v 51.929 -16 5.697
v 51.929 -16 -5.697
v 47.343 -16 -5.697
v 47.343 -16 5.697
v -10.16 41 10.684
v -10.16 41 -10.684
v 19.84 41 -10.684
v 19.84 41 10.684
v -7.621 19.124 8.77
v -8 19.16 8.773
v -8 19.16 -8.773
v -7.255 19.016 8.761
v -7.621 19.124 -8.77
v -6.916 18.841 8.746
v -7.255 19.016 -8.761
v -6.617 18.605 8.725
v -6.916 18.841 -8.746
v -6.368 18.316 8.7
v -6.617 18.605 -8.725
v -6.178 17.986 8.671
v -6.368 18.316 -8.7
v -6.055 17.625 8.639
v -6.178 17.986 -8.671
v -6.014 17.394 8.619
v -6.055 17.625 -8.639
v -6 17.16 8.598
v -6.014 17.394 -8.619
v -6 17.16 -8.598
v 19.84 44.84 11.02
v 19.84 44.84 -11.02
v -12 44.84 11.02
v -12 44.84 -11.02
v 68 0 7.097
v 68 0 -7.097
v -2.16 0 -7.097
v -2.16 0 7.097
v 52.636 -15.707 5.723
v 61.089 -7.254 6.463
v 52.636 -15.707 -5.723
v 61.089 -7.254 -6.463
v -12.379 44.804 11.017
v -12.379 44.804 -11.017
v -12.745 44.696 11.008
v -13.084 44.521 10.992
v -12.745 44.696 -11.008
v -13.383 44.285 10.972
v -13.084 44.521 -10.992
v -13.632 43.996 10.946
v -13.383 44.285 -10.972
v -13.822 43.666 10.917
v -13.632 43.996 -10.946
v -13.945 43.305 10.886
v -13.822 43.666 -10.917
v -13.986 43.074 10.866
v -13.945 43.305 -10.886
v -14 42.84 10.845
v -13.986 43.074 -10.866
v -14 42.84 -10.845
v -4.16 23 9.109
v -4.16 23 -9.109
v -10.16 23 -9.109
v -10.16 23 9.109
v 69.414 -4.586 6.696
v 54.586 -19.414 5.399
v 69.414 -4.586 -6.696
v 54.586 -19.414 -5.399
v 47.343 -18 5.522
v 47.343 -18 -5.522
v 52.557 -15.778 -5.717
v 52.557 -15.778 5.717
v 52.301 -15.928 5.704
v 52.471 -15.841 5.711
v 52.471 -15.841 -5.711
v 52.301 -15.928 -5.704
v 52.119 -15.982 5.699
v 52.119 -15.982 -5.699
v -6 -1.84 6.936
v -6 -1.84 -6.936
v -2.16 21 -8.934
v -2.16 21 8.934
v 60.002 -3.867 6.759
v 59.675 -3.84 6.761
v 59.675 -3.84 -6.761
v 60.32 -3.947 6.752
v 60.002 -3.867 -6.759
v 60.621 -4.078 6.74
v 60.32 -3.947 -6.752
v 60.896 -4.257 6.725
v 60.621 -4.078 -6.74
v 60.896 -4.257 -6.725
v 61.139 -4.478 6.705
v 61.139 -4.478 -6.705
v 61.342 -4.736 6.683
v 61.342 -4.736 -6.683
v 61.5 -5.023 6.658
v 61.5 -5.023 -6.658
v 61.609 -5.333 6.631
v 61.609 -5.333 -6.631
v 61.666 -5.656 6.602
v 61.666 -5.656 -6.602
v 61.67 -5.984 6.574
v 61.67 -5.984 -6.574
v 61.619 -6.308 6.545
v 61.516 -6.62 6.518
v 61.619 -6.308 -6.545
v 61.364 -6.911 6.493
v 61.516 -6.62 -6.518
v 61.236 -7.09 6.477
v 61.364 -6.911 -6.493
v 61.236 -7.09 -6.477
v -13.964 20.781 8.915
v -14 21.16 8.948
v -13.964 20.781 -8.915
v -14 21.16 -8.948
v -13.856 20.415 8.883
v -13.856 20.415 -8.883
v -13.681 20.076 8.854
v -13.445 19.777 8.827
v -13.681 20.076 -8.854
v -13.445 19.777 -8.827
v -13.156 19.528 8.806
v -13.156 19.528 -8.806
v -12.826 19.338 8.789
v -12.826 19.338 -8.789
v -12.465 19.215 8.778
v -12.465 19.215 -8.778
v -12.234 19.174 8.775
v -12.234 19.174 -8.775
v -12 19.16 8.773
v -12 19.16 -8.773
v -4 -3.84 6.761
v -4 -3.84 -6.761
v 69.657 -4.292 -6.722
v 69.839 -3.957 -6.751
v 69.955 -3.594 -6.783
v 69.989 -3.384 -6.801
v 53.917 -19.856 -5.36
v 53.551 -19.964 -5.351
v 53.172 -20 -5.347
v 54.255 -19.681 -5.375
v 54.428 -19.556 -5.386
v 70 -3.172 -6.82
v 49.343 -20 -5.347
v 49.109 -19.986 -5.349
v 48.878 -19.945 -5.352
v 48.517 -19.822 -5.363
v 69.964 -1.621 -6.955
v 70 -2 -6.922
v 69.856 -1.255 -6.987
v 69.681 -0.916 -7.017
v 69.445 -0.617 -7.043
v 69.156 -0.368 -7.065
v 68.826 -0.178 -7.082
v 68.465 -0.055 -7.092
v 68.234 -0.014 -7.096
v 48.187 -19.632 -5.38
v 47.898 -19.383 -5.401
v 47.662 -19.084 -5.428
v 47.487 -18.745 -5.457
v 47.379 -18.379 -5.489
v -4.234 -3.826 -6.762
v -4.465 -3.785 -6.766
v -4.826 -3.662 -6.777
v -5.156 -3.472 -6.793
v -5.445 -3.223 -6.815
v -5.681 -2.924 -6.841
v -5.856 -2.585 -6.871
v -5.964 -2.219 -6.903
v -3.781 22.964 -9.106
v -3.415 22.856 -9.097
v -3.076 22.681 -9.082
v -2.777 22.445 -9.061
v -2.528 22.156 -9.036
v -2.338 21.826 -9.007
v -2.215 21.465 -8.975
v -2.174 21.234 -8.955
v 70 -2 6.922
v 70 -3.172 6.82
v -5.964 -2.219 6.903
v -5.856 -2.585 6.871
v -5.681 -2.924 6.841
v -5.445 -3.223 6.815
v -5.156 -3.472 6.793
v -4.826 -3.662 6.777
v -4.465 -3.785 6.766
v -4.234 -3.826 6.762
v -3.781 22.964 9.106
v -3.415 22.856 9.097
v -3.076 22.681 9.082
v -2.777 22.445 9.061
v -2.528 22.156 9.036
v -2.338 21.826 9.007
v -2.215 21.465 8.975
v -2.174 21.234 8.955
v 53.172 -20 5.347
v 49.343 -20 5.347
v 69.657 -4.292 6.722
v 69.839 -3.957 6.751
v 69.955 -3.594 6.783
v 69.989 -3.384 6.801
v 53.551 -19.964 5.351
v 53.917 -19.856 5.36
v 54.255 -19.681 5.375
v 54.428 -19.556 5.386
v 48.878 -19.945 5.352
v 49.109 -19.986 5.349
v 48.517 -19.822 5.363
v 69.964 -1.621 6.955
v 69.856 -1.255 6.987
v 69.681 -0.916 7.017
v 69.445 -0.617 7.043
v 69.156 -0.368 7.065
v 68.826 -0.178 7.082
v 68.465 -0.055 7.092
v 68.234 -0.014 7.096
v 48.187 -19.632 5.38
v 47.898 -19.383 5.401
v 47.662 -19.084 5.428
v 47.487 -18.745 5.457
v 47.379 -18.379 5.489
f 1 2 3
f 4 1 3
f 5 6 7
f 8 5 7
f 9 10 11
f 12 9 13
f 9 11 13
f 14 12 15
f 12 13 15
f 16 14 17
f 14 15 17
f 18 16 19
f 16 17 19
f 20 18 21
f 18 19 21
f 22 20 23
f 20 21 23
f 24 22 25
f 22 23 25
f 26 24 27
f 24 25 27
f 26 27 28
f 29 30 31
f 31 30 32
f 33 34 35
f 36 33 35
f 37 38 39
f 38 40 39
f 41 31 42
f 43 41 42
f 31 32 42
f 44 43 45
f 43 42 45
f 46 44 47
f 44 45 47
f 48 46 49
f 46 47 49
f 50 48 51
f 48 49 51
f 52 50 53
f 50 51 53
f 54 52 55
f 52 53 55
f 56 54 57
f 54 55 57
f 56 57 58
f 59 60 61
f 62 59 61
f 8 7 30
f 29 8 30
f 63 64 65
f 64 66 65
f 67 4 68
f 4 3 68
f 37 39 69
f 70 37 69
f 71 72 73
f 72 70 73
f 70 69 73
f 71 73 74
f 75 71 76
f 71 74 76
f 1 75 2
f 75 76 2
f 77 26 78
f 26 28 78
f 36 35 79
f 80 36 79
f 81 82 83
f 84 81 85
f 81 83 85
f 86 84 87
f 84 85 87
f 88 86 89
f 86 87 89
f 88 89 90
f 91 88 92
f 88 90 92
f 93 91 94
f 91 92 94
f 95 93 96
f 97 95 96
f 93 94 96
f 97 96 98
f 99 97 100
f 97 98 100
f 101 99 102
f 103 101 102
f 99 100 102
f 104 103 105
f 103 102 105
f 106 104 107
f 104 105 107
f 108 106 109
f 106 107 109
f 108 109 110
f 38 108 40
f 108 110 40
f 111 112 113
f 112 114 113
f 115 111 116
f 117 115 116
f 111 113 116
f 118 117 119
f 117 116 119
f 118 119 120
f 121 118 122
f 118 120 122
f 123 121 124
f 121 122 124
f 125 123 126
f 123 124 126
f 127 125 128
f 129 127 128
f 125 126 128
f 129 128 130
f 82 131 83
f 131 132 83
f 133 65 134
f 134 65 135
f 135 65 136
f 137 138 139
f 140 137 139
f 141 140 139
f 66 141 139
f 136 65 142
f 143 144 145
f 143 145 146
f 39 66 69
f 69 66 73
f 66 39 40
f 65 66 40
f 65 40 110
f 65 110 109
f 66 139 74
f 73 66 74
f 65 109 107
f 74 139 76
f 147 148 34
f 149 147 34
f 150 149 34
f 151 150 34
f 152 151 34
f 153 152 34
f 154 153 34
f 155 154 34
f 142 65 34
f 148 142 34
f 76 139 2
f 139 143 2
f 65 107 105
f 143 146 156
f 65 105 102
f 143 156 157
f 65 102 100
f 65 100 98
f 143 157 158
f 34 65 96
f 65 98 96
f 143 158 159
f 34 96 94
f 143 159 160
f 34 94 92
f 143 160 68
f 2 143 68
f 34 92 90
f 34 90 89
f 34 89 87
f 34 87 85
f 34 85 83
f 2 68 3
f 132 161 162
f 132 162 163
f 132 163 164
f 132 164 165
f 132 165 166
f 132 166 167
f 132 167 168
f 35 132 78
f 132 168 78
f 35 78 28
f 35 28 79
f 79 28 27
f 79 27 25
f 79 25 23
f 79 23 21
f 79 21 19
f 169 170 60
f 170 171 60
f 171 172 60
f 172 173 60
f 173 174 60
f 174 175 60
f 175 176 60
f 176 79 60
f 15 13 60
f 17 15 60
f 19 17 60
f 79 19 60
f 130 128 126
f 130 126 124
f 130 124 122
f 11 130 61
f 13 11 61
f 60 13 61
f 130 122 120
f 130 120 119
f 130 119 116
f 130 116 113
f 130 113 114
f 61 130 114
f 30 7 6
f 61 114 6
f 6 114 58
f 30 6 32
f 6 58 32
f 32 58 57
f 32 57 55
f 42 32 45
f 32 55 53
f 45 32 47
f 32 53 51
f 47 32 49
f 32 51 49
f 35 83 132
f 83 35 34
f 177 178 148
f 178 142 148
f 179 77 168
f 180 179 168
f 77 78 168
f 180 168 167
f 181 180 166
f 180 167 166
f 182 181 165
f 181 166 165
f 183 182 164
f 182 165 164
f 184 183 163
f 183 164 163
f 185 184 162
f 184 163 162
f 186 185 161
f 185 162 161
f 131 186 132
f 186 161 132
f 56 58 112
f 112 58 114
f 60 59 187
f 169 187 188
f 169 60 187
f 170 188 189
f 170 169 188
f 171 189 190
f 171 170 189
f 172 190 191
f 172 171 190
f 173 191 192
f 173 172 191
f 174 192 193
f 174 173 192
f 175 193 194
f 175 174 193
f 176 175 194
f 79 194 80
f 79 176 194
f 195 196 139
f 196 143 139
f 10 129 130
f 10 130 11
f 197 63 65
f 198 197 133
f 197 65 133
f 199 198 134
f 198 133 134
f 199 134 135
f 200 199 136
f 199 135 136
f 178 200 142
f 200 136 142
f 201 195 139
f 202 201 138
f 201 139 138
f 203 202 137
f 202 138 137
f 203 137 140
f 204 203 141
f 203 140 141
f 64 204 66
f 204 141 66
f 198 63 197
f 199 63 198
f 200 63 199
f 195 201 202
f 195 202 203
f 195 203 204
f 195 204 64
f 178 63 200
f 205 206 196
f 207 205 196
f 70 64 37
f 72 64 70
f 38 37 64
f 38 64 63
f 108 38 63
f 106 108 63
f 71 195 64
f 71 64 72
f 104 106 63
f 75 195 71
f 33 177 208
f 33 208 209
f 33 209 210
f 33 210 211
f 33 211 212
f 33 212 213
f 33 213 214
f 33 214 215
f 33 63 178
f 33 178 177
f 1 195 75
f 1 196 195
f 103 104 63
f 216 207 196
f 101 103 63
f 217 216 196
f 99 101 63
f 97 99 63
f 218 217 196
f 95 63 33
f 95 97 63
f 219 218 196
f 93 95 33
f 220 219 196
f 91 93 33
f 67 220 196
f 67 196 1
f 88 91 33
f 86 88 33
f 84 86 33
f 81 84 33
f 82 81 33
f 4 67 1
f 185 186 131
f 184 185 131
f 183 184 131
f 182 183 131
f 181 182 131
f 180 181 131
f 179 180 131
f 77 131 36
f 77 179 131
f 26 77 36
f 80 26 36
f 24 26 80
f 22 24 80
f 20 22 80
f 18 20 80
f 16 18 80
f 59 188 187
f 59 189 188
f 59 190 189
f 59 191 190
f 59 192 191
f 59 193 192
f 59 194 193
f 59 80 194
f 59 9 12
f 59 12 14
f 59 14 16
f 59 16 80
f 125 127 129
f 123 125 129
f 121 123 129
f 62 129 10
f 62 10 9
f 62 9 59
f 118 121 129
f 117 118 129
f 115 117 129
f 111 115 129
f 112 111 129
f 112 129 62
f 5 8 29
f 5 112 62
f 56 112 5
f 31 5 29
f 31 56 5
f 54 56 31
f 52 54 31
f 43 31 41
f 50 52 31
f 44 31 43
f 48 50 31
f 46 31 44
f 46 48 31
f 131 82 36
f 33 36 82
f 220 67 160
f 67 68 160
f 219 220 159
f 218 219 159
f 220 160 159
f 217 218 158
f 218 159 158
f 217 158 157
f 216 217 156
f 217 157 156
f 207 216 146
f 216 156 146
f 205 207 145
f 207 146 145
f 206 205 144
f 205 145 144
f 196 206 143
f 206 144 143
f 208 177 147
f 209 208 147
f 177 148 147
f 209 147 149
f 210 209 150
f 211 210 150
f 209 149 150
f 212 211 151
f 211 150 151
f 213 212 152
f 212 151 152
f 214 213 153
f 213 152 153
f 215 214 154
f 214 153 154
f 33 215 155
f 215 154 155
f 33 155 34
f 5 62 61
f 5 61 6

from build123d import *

# Parameters (mm, degrees)
F1_DEPTH = 30
F5_REACH = 130.7668048394
F6_DEPTH = 30
F8_R     = 2


# Not quite as in the source:
# - two fillets or chamfers of one size are made in one step


with BuildPart() as f1:
    # F0 (on Top) → F1 (new body, symmetric)
    with BuildSketch(Plane.XY):
        with BuildLine():
            Line((-2.159999702, 23), (-10.159999702, 23))
            Line((-10.159999702, 23), (-10.159999702, 41))
            Line((-10.159999702, 41), (19.840000298, 41))
            Line((19.840000298, 41), (19.840000298, 44.84))
            Line((19.840000298, 44.84), (-13.999999702, 44.84))
            Line((-13.999999702, 44.84), (-13.999999702, 19.16))
            Line((-13.999999702, 19.16), (-5.999999702, 19.16))
            Line((-5.999999702, 19.16), (-5.999999702, -3.84))
            Line((-5.999999702, -3.84), (64.5031457505, -3.84))
            Line((64.5031457505, -3.84), (52.6360389693, -15.7071067812))
            ThreePointArc((52.6360389693, -15.7071067812), (52.3116156205, -15.9238795325), (51.9289321881, -16))
            Line((51.9289321881, -16), (47.3431457505, -16))
            Line((47.3431457505, -16), (47.3431457505, -20))
            Line((47.3431457505, -20), (54, -20))
            Line((54, -20), (70, -4))
            Line((70, -4), (70, 0))
            Line((70, 0), (-2.159999702, 0))
            Line((-2.159999702, 0), (-2.159999702, 23))
        make_face()
    extrude(amount=F1_DEPTH, both=True)

    f5_end = Plane(origin=(0, -0.6162060448, 7.0432673219), x_dir=(0, 0.9961946981, 0.0871557427), z_dir=(0, -0.0871557427, 0.9961946981))
    # F1_face2 (on face) → F5 (cut, up to a plane its end follows)
    with BuildSketch(Plane(origin=(19.935386065, 10.6416249654, 30), x_dir=(1, 0, 0), z_dir=(0, 0, 1))):
        with BuildLine():
            Line((-22.095385767, -10.6416249654), (-22.095385767, 12.3583750346))
            Line((-22.095385767, 12.3583750346), (-30.095385767, 12.3583750346))
            Line((-30.095385767, 12.3583750346), (-30.095385767, 30.3583750346))
            Line((-30.095385767, 30.3583750346), (-0.095385767, 30.3583750346))
            Line((-0.095385767, 30.3583750346), (-0.095385767, 34.1983750346))
            Line((-0.095385767, 34.1983750346), (-33.935385767, 34.1983750346))
            Line((-33.935385767, 34.1983750346), (-33.935385767, 8.5183750346))
            Line((-33.935385767, 8.5183750346), (-25.935385767, 8.5183750346))
            Line((-25.935385767, 8.5183750346), (-25.935385767, -14.4816249654))
            Line((-25.935385767, -14.4816249654), (44.5677596855, -14.4816249654))
            Line((44.5677596855, -14.4816249654), (32.7006529043, -26.3487317465))
            ThreePointArc((32.7006529043, -26.3487317465), (32.3762295555, -26.5655044979), (31.9935461231, -26.6416249654))
            Line((31.9935461231, -26.6416249654), (27.4077596855, -26.6416249654))
            Line((27.4077596855, -26.6416249654), (27.4077596855, -30.6416249654))
            Line((27.4077596855, -30.6416249654), (34.064613935, -30.6416249654))
            Line((34.064613935, -30.6416249654), (50.064613935, -14.6416249654))
            Line((50.064613935, -14.6416249654), (50.064613935, -10.6416249654))
            Line((50.064613935, -10.6416249654), (-22.095385767, -10.6416249654))
        make_face()
    f5_long = extrude(amount=-F5_REACH, mode=Mode.PRIVATE)
    add(split(f5_long, bisect_by=f5_end, keep=Keep.TOP, mode=Mode.PRIVATE), mode=Mode.SUBTRACT)

    # F6 (cut, through all): a face of the model
    f6_faces = [f1.faces().sort_by_distance(p)[0] for p in [
        (-3.2211418013, 11.5, -30),
    ]]
    extrude(f6_faces, amount=-F6_DEPTH, mode=Mode.SUBTRACT)

    # F7: F1 across plane


with BuildPart() as f1_1:
    add(f1.part)
    add(f1.part.mirror(Plane.XY))

    # F8
    f8_edges = [f1_1.edges().sort_by_distance(p)[0] for p in [
        (70, 0, 0),
        (70, -4, 0),
        (54, -20, 0),
        (47.343146, -20, 0),
        (-2.16, 23, 0),
        (-14, 44.84, 0),
        (-14, 19.16, 0),
        (-6, 19.16, 0),
        (-6, -3.84, 0),
        (64.503146, -3.84, 0),
    ]]
    fillet(f8_edges, radius=F8_R)


solid = f1_1.part
